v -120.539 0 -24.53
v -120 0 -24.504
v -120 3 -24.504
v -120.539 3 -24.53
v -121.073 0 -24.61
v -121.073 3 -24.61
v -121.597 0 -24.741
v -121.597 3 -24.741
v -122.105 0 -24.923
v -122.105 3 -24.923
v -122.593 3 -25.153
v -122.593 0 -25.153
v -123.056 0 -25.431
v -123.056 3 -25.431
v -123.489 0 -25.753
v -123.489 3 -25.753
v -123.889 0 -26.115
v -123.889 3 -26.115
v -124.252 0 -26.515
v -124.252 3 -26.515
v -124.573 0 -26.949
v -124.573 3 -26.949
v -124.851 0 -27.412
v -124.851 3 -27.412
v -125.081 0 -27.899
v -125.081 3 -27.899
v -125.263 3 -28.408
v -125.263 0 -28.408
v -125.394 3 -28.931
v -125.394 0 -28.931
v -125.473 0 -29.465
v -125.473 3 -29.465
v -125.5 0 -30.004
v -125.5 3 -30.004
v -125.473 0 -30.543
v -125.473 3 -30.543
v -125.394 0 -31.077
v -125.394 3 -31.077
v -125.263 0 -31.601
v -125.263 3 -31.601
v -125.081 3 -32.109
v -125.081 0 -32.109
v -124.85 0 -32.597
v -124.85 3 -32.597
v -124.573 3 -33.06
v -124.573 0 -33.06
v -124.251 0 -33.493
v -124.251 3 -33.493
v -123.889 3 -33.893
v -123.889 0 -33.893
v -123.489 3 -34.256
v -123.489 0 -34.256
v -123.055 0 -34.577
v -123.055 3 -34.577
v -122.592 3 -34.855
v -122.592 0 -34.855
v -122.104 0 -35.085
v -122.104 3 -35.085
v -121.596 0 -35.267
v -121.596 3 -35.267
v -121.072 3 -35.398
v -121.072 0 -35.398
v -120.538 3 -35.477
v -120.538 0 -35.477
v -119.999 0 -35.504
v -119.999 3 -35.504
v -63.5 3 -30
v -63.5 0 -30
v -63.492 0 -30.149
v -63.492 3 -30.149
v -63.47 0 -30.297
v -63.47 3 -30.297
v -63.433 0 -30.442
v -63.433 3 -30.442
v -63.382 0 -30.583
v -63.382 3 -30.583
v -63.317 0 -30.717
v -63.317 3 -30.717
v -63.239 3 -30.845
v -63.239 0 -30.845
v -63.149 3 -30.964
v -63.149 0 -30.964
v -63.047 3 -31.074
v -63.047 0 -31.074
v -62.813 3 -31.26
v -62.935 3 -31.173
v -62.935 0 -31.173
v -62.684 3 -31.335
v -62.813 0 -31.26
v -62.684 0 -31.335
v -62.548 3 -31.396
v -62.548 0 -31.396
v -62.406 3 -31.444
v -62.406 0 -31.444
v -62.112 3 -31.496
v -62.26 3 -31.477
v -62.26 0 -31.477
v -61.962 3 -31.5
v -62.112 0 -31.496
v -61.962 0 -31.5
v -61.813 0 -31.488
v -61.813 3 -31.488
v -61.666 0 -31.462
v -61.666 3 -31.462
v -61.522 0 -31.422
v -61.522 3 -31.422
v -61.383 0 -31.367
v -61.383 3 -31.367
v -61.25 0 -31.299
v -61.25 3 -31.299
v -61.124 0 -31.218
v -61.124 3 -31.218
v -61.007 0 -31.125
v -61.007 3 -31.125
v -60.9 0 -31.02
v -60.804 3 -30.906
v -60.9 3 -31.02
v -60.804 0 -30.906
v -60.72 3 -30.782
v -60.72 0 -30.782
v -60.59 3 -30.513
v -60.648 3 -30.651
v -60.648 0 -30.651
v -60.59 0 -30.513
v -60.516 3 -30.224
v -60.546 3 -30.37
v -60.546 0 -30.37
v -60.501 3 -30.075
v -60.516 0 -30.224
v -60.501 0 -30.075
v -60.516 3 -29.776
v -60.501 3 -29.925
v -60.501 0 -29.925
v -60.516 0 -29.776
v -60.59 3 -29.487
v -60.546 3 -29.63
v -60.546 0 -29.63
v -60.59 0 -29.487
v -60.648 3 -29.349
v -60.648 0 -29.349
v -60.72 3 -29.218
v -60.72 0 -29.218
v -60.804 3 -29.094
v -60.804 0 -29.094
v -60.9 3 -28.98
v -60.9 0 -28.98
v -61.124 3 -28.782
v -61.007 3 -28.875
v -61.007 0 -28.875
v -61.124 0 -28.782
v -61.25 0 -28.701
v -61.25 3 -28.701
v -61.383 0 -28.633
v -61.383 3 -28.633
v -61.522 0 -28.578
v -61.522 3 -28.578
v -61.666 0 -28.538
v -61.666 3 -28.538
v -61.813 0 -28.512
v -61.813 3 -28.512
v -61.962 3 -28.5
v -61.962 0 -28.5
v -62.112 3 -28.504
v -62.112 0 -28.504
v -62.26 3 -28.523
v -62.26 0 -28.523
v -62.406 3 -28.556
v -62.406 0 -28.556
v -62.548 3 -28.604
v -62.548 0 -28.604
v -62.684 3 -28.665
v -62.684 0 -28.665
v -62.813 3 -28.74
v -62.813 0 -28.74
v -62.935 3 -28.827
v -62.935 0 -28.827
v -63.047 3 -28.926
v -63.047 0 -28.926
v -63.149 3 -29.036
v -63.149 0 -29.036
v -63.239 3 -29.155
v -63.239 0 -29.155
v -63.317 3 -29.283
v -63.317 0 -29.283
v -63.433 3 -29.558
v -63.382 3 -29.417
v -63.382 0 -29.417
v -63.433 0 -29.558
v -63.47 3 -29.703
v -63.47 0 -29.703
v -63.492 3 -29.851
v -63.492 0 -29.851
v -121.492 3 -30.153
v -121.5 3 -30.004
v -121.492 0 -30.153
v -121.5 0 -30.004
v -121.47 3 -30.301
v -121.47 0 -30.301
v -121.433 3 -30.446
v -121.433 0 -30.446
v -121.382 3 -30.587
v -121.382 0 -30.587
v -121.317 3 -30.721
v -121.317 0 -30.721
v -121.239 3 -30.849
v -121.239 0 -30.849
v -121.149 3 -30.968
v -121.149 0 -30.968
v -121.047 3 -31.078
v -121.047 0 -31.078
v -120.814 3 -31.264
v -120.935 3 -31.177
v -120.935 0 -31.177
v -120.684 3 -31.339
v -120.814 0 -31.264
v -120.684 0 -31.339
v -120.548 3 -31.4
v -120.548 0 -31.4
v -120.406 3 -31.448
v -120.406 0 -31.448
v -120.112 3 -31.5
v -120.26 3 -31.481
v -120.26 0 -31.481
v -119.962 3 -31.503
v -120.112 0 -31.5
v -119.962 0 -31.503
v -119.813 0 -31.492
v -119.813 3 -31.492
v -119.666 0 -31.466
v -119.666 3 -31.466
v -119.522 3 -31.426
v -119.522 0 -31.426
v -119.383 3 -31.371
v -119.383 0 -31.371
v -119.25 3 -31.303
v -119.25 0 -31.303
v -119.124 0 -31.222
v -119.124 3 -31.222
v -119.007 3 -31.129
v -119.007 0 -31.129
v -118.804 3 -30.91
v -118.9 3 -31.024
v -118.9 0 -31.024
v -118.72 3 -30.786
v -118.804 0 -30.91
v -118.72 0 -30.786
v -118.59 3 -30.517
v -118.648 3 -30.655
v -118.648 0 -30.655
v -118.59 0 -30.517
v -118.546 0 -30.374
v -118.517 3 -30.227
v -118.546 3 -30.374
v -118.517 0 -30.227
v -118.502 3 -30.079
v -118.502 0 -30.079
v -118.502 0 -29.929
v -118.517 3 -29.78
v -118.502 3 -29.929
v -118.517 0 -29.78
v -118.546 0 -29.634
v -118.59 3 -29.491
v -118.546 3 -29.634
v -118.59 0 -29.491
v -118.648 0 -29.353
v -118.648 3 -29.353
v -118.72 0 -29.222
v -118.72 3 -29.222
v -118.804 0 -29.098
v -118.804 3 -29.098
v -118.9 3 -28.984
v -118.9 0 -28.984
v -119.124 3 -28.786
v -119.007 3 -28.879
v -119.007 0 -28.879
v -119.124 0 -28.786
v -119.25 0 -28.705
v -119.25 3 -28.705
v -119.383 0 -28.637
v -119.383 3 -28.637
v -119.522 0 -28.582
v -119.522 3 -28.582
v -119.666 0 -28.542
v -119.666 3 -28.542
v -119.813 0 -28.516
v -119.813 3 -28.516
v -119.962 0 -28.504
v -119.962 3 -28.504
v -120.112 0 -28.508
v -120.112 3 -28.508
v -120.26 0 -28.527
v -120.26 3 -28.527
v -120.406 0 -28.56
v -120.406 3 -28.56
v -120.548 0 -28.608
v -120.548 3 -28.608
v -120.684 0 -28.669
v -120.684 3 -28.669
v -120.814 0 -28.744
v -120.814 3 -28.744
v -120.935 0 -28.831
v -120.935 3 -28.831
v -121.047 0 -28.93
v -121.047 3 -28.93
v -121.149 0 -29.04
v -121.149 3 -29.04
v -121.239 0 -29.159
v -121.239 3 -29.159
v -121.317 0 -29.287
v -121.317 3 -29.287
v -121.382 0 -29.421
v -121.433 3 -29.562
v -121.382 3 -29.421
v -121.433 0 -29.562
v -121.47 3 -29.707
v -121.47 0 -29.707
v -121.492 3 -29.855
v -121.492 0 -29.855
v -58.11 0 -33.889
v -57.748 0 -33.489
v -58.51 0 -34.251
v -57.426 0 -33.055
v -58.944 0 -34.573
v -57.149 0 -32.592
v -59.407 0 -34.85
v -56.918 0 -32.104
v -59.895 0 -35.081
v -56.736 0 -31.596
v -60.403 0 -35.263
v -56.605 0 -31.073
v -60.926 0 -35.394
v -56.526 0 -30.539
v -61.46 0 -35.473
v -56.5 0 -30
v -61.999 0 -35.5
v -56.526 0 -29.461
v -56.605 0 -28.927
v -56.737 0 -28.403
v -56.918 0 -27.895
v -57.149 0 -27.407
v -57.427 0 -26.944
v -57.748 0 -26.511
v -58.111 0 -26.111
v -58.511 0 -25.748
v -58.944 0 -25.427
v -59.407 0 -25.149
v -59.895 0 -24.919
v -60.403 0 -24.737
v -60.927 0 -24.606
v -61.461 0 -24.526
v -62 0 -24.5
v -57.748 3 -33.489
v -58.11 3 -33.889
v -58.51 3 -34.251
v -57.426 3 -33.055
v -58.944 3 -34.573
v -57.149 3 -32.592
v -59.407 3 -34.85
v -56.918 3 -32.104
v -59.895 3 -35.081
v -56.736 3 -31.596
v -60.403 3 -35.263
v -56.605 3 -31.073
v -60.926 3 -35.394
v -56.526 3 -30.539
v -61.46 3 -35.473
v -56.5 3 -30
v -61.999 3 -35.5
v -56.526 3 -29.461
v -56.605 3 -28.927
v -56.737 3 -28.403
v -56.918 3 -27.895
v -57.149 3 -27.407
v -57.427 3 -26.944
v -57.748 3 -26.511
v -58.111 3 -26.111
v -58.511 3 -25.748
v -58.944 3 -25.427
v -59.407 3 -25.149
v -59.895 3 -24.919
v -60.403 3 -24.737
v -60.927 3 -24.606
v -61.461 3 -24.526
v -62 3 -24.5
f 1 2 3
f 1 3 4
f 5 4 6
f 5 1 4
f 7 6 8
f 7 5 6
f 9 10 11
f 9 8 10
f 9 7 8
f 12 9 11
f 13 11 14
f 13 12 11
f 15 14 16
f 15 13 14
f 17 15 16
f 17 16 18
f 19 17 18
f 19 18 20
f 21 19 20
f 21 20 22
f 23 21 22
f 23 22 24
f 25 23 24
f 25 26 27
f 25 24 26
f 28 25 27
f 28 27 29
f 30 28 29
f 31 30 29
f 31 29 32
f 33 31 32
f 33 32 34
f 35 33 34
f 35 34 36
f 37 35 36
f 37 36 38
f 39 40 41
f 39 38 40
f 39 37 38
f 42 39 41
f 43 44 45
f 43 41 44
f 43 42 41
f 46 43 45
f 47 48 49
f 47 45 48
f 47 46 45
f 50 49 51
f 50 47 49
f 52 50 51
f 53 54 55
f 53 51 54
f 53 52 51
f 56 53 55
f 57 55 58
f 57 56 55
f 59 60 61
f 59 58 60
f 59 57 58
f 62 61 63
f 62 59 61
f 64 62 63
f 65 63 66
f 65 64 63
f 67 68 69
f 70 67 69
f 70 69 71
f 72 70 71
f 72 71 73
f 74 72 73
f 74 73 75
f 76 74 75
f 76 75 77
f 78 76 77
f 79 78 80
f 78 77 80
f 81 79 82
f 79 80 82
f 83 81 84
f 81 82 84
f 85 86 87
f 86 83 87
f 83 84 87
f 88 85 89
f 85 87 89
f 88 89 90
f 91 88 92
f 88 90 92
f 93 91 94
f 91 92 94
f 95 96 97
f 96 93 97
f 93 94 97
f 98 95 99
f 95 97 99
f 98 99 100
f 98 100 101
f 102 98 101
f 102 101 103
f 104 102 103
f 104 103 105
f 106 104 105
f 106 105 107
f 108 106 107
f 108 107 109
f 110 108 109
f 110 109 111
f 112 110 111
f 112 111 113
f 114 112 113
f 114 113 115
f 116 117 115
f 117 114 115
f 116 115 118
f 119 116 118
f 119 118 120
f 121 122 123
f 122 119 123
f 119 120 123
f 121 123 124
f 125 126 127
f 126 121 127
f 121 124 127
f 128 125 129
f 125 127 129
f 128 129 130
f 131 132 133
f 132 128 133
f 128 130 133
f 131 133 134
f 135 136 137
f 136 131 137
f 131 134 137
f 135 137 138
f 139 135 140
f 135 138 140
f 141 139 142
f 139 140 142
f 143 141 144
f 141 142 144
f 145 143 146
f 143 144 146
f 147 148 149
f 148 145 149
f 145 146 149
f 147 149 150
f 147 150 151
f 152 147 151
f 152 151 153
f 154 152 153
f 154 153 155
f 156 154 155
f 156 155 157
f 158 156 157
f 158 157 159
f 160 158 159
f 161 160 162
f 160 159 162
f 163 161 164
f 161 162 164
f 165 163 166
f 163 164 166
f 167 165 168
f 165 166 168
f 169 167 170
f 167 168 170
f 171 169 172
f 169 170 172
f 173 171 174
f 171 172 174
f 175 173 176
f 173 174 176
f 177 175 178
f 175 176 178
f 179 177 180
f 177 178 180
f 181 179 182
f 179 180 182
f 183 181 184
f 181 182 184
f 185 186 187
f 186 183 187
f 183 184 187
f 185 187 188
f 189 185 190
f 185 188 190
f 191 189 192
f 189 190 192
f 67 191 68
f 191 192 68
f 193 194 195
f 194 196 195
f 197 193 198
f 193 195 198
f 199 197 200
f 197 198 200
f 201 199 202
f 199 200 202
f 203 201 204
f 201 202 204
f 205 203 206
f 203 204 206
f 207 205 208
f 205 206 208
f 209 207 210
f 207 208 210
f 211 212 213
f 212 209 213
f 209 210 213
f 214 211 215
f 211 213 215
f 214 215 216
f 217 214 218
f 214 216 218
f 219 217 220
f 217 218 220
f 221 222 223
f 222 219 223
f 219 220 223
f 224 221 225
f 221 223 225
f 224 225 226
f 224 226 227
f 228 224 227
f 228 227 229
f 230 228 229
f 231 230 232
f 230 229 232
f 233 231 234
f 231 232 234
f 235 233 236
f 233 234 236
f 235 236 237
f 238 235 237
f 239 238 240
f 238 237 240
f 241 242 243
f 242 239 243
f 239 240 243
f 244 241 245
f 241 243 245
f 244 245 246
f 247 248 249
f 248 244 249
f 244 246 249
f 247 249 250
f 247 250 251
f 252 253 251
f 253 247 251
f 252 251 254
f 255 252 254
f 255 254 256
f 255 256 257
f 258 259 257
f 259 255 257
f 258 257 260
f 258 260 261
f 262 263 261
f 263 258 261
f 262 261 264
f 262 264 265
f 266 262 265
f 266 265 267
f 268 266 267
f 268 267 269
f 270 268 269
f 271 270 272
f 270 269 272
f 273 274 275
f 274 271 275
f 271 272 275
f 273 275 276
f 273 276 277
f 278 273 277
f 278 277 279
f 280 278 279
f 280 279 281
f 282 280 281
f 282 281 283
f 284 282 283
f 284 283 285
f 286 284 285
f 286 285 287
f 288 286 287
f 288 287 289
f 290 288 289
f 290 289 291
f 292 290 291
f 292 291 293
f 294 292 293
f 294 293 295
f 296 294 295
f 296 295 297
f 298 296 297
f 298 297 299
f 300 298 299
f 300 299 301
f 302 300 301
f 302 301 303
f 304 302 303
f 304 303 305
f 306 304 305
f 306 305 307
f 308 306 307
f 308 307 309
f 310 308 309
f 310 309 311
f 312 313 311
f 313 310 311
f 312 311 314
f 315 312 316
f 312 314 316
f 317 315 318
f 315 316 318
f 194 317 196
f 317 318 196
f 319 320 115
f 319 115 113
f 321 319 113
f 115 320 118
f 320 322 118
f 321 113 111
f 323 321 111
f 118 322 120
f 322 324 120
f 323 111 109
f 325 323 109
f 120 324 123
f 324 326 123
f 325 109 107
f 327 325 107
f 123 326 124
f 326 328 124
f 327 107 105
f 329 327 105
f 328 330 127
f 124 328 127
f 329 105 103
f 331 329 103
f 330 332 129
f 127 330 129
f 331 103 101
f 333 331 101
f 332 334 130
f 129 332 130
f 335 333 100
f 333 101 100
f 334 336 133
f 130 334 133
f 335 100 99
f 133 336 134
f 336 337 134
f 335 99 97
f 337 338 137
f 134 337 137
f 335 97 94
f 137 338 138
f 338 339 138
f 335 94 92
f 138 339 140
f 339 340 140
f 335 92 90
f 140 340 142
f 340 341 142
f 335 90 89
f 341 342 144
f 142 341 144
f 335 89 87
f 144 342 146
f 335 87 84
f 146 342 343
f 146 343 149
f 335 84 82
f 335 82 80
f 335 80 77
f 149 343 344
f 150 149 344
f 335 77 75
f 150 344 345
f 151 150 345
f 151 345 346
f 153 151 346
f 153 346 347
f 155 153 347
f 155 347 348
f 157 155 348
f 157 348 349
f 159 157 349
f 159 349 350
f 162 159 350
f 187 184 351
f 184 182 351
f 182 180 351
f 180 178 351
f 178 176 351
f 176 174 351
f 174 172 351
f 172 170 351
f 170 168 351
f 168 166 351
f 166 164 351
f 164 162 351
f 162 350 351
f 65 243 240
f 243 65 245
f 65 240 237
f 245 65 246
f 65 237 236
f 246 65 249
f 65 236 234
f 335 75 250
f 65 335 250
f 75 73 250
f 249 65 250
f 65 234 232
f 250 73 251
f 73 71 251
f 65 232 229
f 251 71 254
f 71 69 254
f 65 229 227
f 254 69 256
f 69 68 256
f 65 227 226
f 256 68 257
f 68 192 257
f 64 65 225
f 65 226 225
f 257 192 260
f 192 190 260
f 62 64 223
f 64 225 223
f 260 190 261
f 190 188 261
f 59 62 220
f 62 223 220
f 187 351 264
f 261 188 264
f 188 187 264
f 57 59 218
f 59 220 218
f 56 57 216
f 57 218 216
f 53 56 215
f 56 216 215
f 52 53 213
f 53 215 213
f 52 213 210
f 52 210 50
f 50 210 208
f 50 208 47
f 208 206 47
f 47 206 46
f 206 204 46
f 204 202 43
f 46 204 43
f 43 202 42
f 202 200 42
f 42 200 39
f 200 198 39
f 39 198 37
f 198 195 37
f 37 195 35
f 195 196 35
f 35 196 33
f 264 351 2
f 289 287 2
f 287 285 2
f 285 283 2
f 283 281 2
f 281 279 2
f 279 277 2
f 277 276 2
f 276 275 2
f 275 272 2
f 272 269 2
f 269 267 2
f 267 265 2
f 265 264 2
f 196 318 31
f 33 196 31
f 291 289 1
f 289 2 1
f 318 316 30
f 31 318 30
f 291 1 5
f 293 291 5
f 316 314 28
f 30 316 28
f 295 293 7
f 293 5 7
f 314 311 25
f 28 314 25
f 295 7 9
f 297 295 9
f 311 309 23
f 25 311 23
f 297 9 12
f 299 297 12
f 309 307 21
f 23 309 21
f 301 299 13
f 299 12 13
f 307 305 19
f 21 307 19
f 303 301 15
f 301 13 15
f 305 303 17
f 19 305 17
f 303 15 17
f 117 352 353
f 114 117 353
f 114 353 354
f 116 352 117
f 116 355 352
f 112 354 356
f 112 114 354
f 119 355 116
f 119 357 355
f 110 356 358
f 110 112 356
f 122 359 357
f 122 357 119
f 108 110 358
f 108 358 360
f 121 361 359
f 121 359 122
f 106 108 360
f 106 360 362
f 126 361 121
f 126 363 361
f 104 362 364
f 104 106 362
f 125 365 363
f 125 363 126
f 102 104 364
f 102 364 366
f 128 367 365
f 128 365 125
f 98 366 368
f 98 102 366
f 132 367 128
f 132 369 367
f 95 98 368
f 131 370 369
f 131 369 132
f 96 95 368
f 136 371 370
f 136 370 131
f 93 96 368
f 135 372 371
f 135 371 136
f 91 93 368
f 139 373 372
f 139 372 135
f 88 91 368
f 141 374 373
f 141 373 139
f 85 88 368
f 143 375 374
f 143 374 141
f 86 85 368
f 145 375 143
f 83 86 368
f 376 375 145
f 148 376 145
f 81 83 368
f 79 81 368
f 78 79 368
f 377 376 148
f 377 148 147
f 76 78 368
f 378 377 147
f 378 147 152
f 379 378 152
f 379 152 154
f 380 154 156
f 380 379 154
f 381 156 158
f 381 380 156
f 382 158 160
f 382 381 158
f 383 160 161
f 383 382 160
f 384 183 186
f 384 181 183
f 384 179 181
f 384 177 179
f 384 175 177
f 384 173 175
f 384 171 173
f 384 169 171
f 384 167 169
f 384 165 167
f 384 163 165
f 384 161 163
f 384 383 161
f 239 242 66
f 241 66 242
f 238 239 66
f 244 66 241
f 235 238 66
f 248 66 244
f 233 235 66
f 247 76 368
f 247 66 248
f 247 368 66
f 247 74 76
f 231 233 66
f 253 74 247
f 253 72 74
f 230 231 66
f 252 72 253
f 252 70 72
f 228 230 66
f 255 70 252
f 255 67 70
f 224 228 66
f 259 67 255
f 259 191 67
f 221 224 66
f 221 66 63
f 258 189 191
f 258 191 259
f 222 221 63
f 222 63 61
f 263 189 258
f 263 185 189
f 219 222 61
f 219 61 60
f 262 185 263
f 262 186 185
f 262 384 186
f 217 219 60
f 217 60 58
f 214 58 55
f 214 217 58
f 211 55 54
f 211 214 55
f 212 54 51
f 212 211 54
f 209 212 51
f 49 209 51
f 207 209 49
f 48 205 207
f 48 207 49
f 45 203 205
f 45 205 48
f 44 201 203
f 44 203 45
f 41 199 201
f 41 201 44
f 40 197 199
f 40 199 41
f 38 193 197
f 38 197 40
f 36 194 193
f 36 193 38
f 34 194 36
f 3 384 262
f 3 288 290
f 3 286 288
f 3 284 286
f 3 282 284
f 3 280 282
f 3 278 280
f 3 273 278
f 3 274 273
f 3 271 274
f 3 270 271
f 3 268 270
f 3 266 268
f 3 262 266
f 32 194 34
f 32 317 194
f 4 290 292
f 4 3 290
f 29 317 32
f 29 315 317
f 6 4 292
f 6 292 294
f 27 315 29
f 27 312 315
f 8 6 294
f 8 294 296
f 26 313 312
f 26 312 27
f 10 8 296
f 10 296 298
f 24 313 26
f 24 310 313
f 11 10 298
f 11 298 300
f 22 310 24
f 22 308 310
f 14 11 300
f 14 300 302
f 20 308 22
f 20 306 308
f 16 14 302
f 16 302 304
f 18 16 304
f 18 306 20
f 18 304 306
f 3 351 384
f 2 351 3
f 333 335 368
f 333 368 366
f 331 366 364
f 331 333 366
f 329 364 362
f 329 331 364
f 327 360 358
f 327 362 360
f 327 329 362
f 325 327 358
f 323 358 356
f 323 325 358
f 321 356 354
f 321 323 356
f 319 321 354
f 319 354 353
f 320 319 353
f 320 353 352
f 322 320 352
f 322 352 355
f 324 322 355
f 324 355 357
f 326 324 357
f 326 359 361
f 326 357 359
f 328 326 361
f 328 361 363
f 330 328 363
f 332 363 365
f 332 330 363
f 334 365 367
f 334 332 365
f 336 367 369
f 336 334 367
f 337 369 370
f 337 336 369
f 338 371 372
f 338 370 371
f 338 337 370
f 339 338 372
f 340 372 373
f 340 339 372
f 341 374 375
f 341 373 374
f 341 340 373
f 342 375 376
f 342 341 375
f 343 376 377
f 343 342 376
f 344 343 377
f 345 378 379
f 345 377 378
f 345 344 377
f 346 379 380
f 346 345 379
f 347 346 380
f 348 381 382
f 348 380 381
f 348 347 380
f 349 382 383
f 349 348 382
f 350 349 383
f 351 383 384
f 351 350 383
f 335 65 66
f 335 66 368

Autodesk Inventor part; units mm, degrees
ref_plane "YZ Plane" through (0, 0, 0) normal (1, 0, 0) x (0, 1, 0)
ref_plane "XZ Plane" through (0, 0, 0) normal (0, 1, 0) x (-1, 0, 0)
ref_plane "XY Plane" through (0, 0, 0) normal (0, 0, 1) x (1, 0, 0)
sketch "Boceto1" plane through (0, 0, 0) normal (0, 1, 0) x (-1, 0, 0)
  arc A0 (119.9994, -35.5039) -> (120.0001, -24.5039) centre (119.9998, -30.0039) ccw
  arc A1 (62, -24.5) -> (61.9993, -35.5) centre (61.9996, -30) ccw
  line L0 (62, -24.5) -> (120.0001, -24.5039)
  line L1 (119.9994, -35.5039) -> (61.9993, -35.5)
  circle A2 centre (119.9998, -30.0039) radius 1.5
  circle A3 centre (61.9996, -30) radius 1.5
  point P0 (124.9998, -30.0039)
  point P1 (119.9998, -25.0039)
  dimension "d172" = 3
  dimension "d173" = 3
extrude "Extrusión1" add sketch "Boceto1" along normal blind 3
properties part number "biela"
